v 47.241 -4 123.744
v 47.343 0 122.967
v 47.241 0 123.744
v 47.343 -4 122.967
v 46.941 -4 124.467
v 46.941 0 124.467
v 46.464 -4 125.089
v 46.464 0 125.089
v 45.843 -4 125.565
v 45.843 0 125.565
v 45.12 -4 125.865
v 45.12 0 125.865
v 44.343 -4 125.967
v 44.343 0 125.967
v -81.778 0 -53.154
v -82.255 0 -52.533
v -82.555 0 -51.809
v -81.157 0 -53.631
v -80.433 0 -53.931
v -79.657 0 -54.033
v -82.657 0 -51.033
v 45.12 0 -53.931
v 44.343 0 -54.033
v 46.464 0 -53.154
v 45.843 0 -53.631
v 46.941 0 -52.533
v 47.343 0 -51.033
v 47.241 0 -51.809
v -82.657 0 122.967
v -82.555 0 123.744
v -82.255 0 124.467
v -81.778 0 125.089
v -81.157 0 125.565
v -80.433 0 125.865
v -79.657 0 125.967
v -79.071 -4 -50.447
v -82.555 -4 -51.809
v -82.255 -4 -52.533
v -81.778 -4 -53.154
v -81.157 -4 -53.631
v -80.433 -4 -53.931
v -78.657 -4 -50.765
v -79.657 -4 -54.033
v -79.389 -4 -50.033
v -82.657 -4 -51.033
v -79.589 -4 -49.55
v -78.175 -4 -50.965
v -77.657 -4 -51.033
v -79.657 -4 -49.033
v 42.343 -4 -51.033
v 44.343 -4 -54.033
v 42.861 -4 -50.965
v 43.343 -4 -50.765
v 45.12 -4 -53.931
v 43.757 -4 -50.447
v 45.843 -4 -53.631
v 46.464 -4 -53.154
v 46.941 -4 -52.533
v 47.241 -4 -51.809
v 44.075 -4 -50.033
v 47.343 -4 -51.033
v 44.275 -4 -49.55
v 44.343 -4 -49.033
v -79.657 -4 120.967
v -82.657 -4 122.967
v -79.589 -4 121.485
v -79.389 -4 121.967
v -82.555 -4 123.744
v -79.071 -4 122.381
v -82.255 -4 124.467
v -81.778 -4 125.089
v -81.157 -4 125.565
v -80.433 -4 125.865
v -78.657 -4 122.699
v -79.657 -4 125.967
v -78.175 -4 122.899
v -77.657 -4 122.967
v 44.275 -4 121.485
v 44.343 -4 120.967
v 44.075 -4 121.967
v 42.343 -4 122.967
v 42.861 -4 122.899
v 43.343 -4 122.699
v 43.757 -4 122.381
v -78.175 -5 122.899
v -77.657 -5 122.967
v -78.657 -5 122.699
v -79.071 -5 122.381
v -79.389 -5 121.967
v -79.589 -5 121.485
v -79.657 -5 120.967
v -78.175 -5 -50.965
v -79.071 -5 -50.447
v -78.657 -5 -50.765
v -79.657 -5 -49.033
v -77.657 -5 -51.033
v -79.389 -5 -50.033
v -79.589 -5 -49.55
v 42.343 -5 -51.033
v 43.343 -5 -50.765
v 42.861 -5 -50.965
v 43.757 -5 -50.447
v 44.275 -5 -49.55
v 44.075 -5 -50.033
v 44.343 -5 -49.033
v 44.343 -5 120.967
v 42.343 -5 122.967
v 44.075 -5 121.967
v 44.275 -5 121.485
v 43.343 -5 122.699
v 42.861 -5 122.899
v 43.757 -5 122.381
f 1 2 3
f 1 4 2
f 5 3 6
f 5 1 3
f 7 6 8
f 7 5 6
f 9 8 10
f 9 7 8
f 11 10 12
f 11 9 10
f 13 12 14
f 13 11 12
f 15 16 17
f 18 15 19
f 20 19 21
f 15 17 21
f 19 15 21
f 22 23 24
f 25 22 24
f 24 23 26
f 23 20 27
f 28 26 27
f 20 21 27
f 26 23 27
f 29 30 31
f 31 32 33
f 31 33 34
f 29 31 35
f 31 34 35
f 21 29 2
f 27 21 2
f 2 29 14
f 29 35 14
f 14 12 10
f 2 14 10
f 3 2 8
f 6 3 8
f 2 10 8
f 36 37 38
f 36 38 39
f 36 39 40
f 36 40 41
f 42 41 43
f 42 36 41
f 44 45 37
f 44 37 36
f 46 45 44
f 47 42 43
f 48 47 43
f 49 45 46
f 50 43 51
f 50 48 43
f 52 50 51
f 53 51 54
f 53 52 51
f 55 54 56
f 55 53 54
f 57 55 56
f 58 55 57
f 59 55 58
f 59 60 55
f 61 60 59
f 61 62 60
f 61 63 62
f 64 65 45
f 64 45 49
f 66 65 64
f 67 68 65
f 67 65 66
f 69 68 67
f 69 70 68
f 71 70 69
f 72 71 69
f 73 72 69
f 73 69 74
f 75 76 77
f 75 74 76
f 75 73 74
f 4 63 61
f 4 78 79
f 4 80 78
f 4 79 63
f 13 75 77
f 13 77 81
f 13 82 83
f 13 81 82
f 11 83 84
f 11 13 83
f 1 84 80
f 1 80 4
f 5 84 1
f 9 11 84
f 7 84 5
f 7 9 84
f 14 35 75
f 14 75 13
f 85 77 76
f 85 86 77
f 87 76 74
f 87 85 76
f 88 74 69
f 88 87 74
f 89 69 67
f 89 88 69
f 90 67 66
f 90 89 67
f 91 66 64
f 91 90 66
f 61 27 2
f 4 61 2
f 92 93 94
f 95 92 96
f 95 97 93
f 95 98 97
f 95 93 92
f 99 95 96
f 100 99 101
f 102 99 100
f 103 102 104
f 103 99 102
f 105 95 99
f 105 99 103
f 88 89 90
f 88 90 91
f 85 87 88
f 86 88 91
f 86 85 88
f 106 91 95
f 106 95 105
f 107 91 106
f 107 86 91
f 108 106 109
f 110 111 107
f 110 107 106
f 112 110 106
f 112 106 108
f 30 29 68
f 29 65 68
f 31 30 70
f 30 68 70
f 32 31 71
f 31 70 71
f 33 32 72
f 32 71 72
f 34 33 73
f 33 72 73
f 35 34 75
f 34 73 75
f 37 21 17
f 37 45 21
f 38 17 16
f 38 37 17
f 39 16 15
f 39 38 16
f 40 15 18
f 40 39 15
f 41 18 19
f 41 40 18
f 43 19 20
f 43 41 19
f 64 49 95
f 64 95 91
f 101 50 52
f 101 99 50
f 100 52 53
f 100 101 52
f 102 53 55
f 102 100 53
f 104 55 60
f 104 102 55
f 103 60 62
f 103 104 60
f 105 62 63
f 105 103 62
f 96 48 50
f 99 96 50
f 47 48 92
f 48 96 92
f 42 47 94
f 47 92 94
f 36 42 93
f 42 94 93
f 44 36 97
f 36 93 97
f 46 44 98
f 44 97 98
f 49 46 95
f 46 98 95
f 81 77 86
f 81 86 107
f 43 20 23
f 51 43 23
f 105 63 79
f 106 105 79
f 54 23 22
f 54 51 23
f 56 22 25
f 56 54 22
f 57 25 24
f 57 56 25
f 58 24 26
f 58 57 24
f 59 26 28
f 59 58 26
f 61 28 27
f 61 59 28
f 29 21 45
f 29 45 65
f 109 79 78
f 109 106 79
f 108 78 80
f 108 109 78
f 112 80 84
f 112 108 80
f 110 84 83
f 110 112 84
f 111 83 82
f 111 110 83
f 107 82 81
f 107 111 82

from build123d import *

# Parameters (mm, degrees)
F0_W     = 130
F0_H     = 180
F1_DEPTH = 4
F2_R     = 3
F3_W     = 124
F3_H     = 174
F4_DEPTH = 1
F5_R     = 2


with BuildPart() as f1:
    # F0 (on Front) → F1 (new body)
    with BuildSketch(Plane.XZ):
        with Locations((-17.656866, 35.967222)):
            Rectangle(F0_W, F0_H)
    extrude(amount=F1_DEPTH)

    # F2
    f2_edges = [f1.edges().sort_by_distance(p)[0] for p in [
        (-82.656866, -2, 125.967222),
        (-82.656866, -2, -54.032778),
        (47.343134, -2, -54.032778),
        (47.343134, -2, 125.967222),
    ]]
    fillet(f2_edges, radius=F2_R)

    # F3 (on face) → F4 (join)
    with BuildSketch(Plane.XZ.offset(4)):
        with Locations((-17.656866, 35.967222)):
            Rectangle(F3_W, F3_H)
    extrude(amount=F4_DEPTH)

    # F5
    f5_edges = [f1.edges().sort_by_distance(p)[0] for p in [
        (-79.656866, -4.5, 122.967222),
        (44.343134, -4.5, 122.967222),
        (-79.656866, -4.5, -51.032778),
        (44.343134, -4.5, -51.032778),
    ]]
    fillet(f5_edges, radius=F5_R)


solid = f1.part
